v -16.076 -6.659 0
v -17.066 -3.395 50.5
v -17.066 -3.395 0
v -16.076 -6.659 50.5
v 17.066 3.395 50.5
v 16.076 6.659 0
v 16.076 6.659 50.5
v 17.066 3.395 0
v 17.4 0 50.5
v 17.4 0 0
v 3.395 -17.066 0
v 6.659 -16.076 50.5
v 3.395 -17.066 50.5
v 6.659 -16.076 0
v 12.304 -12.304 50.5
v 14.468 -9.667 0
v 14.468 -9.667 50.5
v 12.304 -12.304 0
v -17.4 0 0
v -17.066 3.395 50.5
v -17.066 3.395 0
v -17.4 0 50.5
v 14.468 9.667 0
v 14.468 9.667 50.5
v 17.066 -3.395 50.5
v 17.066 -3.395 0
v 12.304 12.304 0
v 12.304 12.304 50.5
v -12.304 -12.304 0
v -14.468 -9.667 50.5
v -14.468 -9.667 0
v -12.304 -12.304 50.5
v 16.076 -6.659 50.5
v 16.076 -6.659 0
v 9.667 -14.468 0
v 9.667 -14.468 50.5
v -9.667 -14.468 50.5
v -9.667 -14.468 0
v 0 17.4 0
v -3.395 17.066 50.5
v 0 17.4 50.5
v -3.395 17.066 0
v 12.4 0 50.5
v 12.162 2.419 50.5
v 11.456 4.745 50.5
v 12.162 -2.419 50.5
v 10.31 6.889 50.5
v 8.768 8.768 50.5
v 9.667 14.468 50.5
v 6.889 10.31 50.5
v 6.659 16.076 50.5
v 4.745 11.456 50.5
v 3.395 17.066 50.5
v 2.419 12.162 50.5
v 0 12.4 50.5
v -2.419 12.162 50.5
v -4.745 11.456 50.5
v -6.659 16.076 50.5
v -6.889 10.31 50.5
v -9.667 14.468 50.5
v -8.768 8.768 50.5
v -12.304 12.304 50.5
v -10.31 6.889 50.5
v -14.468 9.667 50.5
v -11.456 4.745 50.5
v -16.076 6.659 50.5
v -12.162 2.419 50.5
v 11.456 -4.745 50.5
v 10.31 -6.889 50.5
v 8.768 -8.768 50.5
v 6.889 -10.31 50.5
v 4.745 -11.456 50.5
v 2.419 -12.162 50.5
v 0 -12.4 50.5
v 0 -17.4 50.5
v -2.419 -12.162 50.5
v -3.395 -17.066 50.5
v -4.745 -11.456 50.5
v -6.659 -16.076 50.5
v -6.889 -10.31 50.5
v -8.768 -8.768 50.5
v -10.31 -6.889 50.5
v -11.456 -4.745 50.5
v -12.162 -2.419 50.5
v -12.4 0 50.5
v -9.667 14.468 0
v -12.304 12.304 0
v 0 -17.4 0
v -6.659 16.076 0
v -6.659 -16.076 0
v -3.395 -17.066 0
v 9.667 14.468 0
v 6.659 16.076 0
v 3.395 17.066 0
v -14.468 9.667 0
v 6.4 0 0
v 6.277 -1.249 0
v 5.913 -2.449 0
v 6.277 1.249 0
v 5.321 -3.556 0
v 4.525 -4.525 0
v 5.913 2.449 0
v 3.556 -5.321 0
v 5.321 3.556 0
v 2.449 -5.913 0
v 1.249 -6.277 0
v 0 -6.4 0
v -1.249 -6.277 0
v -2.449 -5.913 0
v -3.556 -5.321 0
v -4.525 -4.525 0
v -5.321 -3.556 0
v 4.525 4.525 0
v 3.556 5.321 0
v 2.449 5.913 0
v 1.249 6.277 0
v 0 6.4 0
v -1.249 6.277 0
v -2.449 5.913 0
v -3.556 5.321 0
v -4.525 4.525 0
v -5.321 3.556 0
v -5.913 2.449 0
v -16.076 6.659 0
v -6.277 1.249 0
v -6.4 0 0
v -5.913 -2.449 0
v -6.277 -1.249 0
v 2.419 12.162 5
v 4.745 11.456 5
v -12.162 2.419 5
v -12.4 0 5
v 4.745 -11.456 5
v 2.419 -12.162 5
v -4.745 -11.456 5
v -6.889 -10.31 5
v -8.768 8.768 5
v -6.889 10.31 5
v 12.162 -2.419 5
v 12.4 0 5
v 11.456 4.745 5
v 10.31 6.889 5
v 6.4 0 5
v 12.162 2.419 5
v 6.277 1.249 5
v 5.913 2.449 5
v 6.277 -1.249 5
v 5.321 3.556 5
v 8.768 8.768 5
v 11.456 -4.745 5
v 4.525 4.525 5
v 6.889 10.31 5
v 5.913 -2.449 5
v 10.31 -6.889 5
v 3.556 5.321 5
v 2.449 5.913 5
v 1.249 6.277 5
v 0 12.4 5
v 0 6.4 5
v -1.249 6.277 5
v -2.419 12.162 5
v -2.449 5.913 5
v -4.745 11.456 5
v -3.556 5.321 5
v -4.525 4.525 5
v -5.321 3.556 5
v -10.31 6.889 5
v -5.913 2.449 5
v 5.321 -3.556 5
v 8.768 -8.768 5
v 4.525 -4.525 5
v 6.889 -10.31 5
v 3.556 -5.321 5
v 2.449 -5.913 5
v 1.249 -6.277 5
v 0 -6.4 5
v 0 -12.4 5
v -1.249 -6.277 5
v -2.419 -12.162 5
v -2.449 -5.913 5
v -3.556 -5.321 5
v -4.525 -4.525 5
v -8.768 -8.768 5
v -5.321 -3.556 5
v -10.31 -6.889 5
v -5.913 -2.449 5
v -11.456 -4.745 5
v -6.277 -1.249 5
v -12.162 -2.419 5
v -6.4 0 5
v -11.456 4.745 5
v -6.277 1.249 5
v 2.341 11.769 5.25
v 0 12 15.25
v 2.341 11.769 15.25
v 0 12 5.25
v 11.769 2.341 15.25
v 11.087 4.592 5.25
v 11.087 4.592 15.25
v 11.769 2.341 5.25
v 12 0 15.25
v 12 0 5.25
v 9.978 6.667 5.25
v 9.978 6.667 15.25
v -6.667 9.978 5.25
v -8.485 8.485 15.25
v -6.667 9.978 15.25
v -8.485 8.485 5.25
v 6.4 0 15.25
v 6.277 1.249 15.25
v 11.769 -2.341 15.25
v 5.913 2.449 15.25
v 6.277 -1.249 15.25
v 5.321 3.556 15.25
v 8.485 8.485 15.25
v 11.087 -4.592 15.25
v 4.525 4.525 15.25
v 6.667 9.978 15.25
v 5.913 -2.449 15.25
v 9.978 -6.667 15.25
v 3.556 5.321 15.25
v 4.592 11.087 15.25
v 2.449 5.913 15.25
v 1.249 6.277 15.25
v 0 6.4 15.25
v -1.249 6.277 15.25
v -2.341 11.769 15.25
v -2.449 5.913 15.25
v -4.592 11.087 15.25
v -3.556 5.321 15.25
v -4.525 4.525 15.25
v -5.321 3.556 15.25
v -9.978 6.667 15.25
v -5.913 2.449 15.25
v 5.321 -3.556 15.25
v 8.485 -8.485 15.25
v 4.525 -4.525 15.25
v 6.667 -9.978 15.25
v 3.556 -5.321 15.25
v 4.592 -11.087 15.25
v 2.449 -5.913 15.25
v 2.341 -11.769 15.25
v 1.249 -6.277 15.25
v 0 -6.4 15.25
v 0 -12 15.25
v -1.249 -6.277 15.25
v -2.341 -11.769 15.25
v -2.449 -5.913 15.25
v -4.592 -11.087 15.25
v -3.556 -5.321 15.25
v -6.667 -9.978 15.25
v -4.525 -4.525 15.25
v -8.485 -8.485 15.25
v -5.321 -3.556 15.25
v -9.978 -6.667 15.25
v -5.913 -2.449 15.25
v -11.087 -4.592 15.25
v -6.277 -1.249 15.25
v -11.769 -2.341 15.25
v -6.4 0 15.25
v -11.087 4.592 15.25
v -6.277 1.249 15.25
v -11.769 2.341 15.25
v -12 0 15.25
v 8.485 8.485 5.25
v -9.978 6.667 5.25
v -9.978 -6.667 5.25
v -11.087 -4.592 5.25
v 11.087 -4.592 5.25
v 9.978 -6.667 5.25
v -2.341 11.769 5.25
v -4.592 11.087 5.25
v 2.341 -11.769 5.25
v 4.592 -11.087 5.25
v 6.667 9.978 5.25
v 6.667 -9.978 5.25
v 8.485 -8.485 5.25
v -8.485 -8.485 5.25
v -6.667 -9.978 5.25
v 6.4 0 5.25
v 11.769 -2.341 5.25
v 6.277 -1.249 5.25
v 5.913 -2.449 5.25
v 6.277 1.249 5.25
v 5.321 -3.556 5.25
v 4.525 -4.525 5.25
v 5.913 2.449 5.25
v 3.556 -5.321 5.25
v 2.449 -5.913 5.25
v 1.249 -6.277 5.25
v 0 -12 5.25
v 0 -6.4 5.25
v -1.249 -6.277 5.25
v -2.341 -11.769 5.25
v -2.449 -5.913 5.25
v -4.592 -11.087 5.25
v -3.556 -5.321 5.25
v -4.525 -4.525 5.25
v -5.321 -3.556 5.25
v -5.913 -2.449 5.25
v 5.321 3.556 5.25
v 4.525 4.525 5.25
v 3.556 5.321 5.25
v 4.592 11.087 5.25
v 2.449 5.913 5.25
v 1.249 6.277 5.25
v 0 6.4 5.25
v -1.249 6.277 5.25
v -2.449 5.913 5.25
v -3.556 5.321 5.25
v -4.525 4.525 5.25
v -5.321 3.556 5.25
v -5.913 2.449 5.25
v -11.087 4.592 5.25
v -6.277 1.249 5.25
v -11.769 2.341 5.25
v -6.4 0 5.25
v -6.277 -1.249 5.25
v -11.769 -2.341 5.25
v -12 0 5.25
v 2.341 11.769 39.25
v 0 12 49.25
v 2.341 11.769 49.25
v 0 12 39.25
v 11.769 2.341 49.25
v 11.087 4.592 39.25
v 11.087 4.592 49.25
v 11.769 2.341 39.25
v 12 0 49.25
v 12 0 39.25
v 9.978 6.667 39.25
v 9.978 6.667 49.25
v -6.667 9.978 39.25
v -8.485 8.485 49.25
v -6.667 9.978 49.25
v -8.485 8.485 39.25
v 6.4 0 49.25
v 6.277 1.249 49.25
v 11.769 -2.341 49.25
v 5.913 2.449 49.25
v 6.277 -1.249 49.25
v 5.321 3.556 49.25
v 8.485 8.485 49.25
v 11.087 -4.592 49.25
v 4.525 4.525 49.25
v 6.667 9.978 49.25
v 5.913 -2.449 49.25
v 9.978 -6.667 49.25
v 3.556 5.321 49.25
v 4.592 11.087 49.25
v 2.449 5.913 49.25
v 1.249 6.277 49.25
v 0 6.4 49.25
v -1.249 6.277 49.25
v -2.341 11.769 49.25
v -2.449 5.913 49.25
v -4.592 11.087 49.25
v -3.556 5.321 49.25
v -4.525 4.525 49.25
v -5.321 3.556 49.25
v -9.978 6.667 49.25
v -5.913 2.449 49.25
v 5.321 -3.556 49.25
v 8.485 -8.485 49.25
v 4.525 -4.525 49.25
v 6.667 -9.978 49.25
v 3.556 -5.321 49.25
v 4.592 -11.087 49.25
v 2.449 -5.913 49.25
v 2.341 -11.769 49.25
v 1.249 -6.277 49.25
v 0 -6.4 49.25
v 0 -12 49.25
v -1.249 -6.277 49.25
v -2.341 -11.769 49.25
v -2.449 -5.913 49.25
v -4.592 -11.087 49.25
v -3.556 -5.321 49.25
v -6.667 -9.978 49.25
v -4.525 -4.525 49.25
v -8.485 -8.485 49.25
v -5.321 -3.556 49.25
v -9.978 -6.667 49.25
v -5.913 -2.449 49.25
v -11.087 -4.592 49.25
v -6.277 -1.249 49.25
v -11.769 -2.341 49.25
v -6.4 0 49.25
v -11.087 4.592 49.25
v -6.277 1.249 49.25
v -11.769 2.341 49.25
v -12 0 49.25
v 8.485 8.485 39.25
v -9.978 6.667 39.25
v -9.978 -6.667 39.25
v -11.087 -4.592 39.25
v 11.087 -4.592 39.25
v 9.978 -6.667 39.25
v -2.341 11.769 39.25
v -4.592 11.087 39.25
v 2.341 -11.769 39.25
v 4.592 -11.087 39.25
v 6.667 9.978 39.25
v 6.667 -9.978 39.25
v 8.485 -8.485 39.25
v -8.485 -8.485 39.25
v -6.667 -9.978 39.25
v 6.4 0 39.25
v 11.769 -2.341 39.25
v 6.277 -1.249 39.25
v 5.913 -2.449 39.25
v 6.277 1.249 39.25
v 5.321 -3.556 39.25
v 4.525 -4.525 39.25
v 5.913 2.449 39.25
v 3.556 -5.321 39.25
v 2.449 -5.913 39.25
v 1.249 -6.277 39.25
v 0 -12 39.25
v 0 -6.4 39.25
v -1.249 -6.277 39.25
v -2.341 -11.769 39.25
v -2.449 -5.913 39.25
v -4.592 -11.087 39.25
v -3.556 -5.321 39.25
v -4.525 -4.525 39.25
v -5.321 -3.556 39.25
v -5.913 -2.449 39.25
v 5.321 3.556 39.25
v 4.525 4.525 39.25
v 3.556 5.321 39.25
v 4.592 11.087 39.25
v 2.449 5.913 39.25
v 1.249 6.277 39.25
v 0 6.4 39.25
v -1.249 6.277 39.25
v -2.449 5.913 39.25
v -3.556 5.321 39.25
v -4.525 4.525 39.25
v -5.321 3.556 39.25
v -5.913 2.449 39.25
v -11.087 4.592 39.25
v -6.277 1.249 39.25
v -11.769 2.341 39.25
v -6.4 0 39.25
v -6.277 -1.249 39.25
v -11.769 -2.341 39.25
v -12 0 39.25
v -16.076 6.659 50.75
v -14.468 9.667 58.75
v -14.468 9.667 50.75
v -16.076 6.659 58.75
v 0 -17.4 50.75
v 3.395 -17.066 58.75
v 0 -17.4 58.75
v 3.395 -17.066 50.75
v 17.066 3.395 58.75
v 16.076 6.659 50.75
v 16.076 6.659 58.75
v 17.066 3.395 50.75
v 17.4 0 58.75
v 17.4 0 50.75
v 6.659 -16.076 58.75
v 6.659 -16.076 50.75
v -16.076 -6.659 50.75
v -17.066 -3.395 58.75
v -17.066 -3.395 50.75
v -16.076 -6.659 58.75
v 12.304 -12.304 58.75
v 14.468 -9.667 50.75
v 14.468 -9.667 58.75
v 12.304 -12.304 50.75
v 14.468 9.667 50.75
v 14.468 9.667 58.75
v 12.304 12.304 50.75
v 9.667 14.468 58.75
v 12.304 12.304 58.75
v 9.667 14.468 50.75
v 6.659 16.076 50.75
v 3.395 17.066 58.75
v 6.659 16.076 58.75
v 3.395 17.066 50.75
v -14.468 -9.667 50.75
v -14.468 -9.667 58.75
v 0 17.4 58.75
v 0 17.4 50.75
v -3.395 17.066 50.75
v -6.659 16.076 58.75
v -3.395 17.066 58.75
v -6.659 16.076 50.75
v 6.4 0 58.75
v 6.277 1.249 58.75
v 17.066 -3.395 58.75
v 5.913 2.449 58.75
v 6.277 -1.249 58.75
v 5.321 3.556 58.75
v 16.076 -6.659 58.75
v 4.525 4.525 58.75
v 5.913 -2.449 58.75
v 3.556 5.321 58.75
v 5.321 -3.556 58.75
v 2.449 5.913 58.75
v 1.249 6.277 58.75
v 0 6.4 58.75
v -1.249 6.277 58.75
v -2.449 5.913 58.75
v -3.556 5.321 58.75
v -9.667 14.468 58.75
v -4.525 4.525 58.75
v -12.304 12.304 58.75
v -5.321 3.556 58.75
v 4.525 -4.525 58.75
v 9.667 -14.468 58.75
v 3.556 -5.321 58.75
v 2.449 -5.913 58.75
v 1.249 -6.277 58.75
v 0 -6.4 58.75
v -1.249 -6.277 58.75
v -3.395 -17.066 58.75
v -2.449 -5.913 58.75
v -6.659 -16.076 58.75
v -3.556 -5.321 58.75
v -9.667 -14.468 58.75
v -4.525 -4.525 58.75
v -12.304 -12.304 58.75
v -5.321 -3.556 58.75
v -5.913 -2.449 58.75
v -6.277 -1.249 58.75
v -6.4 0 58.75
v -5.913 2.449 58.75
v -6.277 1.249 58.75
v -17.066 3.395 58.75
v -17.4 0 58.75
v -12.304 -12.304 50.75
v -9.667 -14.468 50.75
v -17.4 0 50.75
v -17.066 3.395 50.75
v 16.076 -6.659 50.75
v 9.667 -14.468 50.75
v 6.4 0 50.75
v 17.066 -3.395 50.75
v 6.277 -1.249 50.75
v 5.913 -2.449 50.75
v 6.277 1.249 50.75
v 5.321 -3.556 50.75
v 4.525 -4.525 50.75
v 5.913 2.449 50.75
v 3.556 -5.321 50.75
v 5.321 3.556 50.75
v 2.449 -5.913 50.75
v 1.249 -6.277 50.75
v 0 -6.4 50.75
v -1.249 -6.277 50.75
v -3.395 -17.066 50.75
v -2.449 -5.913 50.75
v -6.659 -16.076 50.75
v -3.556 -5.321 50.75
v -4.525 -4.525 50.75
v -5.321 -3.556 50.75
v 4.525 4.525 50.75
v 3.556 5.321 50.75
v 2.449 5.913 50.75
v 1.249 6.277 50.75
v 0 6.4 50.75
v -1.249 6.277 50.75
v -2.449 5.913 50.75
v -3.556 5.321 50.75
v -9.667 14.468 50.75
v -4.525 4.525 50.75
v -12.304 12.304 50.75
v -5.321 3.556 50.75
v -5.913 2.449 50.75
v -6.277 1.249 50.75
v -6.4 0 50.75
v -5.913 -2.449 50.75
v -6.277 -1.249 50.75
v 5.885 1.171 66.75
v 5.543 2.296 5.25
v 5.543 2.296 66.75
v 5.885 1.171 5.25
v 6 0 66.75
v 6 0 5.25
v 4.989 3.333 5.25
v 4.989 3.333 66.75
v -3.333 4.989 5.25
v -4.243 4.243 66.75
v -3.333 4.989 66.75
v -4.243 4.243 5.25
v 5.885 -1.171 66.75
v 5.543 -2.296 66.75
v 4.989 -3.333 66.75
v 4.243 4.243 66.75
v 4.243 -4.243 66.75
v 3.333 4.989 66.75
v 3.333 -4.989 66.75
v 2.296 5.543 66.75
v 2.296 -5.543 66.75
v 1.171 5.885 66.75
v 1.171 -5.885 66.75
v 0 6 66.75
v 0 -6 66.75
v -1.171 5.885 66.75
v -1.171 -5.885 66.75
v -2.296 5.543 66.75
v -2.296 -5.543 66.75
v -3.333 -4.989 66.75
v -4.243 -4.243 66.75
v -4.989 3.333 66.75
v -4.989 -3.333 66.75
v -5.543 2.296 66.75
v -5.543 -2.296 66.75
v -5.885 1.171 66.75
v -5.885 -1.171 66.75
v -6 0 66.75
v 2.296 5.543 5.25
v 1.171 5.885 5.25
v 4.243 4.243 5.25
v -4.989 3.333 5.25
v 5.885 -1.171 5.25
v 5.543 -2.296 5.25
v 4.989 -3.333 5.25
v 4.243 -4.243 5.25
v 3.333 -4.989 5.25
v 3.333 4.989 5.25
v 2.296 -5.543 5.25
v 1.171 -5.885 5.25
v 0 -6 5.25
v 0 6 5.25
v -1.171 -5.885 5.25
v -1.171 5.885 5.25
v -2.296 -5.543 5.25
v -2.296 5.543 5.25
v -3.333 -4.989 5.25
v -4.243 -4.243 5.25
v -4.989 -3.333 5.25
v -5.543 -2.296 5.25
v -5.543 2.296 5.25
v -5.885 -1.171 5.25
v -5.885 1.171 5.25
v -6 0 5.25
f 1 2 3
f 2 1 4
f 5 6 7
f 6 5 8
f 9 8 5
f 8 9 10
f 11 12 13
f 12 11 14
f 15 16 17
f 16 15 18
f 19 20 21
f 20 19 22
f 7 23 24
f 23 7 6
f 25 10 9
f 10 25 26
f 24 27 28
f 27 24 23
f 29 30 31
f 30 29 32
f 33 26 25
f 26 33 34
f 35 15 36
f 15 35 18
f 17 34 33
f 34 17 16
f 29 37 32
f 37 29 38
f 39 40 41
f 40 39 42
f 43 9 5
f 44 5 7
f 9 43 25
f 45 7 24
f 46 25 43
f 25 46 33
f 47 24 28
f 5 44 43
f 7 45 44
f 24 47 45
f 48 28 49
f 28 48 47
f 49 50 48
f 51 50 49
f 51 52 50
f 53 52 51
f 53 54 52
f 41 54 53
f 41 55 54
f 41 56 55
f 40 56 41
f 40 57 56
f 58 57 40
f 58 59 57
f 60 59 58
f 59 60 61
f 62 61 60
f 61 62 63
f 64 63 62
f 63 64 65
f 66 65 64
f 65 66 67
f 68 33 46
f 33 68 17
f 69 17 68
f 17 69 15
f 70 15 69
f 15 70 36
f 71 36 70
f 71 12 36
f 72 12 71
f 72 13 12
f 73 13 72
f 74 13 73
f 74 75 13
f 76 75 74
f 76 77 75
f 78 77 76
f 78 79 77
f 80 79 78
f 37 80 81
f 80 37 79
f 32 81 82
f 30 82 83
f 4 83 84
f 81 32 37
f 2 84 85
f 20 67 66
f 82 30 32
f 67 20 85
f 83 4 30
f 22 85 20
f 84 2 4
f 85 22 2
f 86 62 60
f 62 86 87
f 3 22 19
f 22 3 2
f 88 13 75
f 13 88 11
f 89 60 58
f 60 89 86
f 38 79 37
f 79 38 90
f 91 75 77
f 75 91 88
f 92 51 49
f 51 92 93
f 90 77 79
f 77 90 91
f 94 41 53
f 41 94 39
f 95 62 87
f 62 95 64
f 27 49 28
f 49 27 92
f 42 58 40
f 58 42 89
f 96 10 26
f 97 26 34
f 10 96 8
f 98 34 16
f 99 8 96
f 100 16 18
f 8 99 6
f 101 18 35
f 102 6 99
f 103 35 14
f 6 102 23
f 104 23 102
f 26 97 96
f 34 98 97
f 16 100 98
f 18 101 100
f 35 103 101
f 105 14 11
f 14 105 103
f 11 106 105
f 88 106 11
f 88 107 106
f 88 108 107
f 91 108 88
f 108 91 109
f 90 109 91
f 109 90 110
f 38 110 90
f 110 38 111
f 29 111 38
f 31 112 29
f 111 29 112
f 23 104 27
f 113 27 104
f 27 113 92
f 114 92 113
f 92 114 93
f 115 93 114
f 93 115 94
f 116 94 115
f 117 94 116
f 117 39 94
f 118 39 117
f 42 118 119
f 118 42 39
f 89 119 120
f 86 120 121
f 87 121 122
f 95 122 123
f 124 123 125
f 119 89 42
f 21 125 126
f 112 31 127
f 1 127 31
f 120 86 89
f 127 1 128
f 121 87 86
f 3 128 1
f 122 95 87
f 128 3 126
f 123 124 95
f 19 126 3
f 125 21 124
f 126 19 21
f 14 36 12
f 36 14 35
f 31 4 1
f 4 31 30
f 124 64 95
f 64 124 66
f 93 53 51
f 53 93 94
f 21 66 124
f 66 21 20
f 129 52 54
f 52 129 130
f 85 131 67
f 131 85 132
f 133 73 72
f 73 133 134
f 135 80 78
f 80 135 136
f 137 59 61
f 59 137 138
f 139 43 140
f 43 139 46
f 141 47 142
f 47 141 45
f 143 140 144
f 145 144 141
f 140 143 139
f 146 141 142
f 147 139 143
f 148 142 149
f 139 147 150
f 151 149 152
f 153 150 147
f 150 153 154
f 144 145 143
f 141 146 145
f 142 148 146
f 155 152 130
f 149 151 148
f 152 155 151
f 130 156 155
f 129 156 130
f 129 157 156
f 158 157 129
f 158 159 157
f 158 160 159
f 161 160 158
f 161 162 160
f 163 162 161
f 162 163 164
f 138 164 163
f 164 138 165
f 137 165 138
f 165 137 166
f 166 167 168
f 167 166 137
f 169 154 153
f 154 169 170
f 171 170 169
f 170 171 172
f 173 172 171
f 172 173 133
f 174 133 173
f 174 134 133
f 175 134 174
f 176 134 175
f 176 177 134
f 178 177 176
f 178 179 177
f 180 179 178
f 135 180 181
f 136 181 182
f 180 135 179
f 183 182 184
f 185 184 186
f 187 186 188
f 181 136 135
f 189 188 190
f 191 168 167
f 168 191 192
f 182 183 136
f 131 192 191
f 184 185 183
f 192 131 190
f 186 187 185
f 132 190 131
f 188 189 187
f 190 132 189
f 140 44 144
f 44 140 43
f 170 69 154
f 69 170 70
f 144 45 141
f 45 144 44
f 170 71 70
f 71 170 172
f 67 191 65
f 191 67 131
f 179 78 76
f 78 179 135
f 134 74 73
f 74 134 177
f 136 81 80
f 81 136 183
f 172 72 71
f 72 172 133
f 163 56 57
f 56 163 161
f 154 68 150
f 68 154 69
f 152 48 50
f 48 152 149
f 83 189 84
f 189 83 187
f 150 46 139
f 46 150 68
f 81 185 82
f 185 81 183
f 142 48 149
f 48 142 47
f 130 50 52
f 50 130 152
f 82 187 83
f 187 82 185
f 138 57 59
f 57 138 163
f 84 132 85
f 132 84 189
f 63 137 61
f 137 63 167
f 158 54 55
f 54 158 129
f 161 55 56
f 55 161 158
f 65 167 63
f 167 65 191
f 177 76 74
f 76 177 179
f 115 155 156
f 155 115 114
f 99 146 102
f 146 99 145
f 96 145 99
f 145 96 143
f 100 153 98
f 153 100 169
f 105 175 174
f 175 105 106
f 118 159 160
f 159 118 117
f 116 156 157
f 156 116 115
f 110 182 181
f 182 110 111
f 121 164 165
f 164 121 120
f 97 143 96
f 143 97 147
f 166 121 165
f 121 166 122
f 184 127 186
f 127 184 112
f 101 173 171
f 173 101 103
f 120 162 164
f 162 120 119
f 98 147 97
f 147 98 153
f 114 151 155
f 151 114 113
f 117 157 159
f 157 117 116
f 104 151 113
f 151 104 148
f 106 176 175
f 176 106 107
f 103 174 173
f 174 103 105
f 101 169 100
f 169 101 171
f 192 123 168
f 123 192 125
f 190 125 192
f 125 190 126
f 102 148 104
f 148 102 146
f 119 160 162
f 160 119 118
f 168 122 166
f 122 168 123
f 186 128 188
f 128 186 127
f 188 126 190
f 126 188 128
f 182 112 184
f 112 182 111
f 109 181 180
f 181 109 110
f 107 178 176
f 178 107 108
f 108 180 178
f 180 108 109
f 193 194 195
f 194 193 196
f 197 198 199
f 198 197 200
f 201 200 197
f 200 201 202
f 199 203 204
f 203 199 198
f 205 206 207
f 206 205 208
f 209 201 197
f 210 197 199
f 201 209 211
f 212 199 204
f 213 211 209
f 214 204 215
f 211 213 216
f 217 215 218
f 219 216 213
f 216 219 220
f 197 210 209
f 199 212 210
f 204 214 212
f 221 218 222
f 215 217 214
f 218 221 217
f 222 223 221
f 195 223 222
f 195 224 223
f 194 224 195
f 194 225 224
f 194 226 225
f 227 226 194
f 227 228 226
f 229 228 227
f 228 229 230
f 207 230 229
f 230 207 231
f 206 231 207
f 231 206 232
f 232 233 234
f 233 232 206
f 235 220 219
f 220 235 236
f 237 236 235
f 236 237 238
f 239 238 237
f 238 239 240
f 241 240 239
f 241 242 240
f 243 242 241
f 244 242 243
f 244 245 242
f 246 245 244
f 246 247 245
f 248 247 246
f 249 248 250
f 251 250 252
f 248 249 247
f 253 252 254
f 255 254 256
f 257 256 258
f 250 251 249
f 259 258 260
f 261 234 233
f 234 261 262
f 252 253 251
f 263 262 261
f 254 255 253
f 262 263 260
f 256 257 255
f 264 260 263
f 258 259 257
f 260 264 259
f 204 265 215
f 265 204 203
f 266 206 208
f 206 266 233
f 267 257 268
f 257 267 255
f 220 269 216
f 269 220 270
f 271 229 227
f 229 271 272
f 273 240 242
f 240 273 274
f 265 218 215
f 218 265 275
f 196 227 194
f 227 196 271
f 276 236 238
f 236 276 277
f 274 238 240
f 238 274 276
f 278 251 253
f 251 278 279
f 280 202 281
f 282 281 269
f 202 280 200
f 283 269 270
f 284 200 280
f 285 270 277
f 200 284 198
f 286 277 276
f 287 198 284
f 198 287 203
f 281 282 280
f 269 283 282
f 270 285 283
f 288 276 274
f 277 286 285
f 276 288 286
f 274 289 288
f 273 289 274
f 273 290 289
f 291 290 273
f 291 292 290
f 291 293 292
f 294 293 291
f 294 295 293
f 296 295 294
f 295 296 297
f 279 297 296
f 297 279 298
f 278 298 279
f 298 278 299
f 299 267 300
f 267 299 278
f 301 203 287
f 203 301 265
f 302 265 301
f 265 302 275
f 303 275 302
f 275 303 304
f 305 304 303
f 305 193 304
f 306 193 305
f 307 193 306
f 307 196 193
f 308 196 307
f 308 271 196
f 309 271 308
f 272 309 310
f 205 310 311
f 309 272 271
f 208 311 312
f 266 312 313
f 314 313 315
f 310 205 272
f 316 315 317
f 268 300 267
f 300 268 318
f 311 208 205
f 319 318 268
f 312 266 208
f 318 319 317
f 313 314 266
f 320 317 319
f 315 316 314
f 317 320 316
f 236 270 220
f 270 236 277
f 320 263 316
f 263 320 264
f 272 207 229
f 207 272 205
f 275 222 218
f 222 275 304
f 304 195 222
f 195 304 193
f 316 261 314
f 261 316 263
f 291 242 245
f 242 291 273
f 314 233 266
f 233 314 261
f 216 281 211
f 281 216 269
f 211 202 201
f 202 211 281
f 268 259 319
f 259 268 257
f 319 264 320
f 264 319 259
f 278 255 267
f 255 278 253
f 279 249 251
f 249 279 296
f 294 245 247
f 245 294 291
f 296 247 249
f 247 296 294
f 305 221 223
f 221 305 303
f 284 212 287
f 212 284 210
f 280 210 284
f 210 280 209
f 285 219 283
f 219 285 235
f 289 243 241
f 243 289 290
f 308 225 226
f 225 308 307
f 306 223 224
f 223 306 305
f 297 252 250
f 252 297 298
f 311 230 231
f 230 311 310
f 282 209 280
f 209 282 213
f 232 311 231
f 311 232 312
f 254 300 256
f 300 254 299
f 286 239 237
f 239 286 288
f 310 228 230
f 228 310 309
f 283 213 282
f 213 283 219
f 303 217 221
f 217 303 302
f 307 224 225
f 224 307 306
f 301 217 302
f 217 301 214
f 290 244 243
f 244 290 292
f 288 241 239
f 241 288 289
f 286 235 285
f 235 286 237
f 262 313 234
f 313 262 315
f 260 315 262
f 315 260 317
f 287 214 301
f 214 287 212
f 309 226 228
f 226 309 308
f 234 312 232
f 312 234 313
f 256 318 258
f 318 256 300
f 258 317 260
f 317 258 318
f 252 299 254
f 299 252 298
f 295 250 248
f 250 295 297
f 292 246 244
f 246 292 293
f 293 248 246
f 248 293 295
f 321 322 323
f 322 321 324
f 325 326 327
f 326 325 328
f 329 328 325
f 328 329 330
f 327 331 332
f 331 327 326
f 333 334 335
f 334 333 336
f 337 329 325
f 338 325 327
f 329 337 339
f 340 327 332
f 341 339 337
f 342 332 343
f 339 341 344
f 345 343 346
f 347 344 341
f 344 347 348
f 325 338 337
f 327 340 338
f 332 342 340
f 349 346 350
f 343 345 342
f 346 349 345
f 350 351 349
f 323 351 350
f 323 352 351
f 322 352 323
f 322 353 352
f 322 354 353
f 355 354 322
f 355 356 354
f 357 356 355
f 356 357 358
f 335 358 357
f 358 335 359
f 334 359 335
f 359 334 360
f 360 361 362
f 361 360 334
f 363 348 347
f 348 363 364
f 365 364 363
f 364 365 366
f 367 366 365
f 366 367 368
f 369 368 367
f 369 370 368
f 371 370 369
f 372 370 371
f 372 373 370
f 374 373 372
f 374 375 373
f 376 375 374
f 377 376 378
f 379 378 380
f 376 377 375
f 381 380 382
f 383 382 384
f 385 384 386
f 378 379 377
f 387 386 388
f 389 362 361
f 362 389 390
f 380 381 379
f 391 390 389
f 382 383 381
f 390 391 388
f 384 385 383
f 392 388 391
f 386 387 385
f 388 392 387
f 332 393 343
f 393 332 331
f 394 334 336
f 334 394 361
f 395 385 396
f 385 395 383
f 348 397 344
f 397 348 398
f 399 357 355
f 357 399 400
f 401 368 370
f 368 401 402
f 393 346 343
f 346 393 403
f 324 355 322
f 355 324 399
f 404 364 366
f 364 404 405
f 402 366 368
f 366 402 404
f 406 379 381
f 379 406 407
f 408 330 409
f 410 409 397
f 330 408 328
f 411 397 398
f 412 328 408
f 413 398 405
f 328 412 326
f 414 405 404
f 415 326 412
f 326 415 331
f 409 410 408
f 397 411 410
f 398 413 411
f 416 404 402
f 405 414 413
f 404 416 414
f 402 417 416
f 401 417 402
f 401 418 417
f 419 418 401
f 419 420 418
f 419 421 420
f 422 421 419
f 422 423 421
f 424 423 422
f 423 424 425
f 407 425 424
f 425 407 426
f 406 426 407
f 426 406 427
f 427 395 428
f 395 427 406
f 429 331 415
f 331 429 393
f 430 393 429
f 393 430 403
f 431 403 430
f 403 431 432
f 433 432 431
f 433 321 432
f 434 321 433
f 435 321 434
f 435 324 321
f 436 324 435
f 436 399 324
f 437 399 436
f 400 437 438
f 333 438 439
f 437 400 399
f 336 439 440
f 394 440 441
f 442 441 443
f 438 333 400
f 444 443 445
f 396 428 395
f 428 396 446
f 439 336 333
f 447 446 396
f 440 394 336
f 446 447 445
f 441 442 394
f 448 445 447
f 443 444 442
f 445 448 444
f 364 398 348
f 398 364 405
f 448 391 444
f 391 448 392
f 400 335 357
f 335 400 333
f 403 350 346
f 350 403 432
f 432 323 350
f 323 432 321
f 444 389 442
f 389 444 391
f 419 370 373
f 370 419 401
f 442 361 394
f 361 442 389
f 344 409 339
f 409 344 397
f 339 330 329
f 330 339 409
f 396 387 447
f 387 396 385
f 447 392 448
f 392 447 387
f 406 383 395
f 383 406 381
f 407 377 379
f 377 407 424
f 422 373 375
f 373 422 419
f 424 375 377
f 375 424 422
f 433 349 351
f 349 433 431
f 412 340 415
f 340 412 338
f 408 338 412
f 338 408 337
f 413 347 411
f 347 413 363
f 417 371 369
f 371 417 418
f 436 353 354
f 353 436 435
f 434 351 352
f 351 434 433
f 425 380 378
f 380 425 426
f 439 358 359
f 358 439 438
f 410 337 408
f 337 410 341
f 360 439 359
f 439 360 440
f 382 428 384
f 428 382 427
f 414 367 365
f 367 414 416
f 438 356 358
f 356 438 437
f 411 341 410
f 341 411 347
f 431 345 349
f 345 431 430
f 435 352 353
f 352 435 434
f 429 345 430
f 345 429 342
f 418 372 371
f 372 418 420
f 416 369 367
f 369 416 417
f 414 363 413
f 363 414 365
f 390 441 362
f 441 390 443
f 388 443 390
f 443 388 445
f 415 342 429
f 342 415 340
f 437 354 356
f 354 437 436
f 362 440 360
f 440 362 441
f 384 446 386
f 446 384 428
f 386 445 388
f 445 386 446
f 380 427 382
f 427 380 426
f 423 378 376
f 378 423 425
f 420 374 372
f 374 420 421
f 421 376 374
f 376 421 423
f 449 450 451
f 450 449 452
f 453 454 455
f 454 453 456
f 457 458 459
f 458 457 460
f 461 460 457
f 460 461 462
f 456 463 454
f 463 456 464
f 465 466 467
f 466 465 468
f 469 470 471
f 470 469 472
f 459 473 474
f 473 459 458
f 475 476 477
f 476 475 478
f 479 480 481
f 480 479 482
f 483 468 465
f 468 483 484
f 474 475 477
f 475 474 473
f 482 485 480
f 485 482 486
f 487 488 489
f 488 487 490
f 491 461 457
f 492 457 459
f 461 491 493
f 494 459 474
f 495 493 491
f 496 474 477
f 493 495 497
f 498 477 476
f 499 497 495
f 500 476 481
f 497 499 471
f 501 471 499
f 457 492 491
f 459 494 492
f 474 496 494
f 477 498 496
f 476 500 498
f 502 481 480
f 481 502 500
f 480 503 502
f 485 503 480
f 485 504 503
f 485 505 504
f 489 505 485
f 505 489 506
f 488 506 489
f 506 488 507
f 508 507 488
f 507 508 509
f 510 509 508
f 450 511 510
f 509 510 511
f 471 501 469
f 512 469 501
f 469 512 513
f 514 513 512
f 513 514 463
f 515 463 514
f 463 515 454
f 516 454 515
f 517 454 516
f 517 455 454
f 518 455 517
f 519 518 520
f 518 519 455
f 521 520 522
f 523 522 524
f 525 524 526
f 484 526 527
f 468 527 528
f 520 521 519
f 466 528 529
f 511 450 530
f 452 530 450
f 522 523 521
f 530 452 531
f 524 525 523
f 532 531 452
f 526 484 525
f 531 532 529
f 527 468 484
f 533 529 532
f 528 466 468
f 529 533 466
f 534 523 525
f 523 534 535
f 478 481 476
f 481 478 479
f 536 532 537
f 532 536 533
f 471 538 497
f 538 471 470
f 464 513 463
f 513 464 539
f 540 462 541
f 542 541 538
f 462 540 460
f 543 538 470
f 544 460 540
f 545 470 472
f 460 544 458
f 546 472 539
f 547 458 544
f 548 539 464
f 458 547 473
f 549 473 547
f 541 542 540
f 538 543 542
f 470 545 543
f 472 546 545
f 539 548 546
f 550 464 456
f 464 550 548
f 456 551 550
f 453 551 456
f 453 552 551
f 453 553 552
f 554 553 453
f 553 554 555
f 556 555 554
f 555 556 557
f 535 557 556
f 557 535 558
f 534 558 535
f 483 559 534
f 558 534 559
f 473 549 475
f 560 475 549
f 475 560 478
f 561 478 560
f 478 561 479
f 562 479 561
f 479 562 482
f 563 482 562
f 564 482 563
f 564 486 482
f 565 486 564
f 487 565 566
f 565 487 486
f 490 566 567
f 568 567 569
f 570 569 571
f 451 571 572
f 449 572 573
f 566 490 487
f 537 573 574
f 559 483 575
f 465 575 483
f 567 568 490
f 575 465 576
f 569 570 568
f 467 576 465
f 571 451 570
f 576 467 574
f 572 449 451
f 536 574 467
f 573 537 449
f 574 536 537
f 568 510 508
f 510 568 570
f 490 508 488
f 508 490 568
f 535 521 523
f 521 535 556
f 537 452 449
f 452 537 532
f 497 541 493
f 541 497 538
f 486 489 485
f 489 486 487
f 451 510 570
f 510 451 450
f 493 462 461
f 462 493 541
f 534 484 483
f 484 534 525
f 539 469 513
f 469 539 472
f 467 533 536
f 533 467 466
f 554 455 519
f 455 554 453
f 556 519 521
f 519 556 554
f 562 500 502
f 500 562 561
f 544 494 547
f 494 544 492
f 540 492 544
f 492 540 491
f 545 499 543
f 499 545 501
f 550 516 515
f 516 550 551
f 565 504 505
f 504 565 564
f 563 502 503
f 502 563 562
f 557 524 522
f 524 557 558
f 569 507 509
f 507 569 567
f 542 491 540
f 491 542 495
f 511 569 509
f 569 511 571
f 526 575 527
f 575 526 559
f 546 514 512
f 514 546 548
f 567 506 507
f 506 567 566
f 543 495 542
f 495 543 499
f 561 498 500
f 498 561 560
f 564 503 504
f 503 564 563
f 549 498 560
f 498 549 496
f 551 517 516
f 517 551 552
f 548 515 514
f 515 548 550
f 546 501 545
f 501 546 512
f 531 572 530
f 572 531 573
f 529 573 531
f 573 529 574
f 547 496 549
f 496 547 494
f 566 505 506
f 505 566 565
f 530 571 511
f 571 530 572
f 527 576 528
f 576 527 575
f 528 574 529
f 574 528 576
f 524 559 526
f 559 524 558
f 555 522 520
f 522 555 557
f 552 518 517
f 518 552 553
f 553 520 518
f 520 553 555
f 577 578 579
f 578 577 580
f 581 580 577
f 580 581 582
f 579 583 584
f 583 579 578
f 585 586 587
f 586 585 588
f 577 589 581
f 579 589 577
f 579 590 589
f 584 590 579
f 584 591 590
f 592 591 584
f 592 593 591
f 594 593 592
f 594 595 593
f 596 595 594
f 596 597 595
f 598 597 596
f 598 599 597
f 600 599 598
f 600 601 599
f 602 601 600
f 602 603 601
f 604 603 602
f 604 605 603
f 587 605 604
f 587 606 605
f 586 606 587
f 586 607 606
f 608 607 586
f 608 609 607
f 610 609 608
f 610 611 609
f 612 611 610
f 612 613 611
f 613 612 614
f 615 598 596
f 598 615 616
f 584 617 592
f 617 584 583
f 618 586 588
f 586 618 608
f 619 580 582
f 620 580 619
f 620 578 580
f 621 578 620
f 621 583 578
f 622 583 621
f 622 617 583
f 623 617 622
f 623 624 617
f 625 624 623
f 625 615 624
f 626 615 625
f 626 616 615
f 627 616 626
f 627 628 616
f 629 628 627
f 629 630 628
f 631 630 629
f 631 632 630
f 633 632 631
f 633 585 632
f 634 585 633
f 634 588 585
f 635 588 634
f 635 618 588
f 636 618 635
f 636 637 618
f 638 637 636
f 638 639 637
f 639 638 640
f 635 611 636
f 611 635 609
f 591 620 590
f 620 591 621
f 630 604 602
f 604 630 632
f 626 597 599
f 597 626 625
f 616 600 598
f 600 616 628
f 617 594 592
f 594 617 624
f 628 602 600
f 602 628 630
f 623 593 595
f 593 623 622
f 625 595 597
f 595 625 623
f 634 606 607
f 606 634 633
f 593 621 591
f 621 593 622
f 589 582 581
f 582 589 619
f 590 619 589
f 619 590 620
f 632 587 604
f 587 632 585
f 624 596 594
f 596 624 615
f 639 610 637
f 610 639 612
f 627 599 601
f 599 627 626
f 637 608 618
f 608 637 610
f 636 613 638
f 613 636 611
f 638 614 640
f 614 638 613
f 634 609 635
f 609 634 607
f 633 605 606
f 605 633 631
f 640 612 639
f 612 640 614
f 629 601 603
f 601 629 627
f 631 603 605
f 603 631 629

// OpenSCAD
$fn = 32;

// ------------------------------------------------------------------------
// Shaft station: cup d34.8 x 50.5 mm, shaft d12
// Every part is its own module, assembly() places every instance.
// ------------------------------------------------------------------------

// --- part 1 ---
module housing_cup() {
  difference() {
    cylinder(h = 50.5, d = 34.8);
    translate([0, 0, 5]) cylinder(h = 46.5, d = 24.8);
    translate([0, 0, -1]) cylinder(h = 7, d = 12.8);
  }
}

// --- part 2 ---
module bearing_lower() {
  difference() {
      translate([0, 0, 0]) cylinder(h = 10, d = 24);
      translate([0, 0, -1]) cylinder(h = 12, d = 12.8);
    }
}

// --- part 3 ---
module bearing_upper() {
  difference() {
      translate([0, 0, 0]) cylinder(h = 10, d = 24);
      translate([0, 0, -1]) cylinder(h = 12, d = 12.8);
    }
}

// --- part 4 ---
module station_shaft() {
  translate([0, 0, -30.75]) cylinder(h = 61.5, d = 12);
}

// --- part 5 ---
module station_cover() {
  difference() {
    cylinder(h = 8, d = 34.8);
    translate([0, 0, -1]) cylinder(h = 10, d = 12.8);
  }
}

// --- assembly ---
module assembly() {
  color([0.80, 0.24, 0.20]) translate([0, 0, 0]) rotate([0, 0, 0]) housing_cup();
  color([0.20, 0.45, 0.75]) translate([0, 0, 5.25]) rotate([0, 0, 0]) bearing_lower();
  color([0.25, 0.62, 0.32]) translate([0, 0, 39.25]) rotate([0, 0, 0]) bearing_upper();
  color([0.92, 0.70, 0.18]) translate([0, 0, 36]) rotate([0, 0, 0]) station_shaft();
  color([0.58, 0.35, 0.70]) translate([0, 0, 50.75]) rotate([0, 0, 0]) station_cover();
}

assembly();
